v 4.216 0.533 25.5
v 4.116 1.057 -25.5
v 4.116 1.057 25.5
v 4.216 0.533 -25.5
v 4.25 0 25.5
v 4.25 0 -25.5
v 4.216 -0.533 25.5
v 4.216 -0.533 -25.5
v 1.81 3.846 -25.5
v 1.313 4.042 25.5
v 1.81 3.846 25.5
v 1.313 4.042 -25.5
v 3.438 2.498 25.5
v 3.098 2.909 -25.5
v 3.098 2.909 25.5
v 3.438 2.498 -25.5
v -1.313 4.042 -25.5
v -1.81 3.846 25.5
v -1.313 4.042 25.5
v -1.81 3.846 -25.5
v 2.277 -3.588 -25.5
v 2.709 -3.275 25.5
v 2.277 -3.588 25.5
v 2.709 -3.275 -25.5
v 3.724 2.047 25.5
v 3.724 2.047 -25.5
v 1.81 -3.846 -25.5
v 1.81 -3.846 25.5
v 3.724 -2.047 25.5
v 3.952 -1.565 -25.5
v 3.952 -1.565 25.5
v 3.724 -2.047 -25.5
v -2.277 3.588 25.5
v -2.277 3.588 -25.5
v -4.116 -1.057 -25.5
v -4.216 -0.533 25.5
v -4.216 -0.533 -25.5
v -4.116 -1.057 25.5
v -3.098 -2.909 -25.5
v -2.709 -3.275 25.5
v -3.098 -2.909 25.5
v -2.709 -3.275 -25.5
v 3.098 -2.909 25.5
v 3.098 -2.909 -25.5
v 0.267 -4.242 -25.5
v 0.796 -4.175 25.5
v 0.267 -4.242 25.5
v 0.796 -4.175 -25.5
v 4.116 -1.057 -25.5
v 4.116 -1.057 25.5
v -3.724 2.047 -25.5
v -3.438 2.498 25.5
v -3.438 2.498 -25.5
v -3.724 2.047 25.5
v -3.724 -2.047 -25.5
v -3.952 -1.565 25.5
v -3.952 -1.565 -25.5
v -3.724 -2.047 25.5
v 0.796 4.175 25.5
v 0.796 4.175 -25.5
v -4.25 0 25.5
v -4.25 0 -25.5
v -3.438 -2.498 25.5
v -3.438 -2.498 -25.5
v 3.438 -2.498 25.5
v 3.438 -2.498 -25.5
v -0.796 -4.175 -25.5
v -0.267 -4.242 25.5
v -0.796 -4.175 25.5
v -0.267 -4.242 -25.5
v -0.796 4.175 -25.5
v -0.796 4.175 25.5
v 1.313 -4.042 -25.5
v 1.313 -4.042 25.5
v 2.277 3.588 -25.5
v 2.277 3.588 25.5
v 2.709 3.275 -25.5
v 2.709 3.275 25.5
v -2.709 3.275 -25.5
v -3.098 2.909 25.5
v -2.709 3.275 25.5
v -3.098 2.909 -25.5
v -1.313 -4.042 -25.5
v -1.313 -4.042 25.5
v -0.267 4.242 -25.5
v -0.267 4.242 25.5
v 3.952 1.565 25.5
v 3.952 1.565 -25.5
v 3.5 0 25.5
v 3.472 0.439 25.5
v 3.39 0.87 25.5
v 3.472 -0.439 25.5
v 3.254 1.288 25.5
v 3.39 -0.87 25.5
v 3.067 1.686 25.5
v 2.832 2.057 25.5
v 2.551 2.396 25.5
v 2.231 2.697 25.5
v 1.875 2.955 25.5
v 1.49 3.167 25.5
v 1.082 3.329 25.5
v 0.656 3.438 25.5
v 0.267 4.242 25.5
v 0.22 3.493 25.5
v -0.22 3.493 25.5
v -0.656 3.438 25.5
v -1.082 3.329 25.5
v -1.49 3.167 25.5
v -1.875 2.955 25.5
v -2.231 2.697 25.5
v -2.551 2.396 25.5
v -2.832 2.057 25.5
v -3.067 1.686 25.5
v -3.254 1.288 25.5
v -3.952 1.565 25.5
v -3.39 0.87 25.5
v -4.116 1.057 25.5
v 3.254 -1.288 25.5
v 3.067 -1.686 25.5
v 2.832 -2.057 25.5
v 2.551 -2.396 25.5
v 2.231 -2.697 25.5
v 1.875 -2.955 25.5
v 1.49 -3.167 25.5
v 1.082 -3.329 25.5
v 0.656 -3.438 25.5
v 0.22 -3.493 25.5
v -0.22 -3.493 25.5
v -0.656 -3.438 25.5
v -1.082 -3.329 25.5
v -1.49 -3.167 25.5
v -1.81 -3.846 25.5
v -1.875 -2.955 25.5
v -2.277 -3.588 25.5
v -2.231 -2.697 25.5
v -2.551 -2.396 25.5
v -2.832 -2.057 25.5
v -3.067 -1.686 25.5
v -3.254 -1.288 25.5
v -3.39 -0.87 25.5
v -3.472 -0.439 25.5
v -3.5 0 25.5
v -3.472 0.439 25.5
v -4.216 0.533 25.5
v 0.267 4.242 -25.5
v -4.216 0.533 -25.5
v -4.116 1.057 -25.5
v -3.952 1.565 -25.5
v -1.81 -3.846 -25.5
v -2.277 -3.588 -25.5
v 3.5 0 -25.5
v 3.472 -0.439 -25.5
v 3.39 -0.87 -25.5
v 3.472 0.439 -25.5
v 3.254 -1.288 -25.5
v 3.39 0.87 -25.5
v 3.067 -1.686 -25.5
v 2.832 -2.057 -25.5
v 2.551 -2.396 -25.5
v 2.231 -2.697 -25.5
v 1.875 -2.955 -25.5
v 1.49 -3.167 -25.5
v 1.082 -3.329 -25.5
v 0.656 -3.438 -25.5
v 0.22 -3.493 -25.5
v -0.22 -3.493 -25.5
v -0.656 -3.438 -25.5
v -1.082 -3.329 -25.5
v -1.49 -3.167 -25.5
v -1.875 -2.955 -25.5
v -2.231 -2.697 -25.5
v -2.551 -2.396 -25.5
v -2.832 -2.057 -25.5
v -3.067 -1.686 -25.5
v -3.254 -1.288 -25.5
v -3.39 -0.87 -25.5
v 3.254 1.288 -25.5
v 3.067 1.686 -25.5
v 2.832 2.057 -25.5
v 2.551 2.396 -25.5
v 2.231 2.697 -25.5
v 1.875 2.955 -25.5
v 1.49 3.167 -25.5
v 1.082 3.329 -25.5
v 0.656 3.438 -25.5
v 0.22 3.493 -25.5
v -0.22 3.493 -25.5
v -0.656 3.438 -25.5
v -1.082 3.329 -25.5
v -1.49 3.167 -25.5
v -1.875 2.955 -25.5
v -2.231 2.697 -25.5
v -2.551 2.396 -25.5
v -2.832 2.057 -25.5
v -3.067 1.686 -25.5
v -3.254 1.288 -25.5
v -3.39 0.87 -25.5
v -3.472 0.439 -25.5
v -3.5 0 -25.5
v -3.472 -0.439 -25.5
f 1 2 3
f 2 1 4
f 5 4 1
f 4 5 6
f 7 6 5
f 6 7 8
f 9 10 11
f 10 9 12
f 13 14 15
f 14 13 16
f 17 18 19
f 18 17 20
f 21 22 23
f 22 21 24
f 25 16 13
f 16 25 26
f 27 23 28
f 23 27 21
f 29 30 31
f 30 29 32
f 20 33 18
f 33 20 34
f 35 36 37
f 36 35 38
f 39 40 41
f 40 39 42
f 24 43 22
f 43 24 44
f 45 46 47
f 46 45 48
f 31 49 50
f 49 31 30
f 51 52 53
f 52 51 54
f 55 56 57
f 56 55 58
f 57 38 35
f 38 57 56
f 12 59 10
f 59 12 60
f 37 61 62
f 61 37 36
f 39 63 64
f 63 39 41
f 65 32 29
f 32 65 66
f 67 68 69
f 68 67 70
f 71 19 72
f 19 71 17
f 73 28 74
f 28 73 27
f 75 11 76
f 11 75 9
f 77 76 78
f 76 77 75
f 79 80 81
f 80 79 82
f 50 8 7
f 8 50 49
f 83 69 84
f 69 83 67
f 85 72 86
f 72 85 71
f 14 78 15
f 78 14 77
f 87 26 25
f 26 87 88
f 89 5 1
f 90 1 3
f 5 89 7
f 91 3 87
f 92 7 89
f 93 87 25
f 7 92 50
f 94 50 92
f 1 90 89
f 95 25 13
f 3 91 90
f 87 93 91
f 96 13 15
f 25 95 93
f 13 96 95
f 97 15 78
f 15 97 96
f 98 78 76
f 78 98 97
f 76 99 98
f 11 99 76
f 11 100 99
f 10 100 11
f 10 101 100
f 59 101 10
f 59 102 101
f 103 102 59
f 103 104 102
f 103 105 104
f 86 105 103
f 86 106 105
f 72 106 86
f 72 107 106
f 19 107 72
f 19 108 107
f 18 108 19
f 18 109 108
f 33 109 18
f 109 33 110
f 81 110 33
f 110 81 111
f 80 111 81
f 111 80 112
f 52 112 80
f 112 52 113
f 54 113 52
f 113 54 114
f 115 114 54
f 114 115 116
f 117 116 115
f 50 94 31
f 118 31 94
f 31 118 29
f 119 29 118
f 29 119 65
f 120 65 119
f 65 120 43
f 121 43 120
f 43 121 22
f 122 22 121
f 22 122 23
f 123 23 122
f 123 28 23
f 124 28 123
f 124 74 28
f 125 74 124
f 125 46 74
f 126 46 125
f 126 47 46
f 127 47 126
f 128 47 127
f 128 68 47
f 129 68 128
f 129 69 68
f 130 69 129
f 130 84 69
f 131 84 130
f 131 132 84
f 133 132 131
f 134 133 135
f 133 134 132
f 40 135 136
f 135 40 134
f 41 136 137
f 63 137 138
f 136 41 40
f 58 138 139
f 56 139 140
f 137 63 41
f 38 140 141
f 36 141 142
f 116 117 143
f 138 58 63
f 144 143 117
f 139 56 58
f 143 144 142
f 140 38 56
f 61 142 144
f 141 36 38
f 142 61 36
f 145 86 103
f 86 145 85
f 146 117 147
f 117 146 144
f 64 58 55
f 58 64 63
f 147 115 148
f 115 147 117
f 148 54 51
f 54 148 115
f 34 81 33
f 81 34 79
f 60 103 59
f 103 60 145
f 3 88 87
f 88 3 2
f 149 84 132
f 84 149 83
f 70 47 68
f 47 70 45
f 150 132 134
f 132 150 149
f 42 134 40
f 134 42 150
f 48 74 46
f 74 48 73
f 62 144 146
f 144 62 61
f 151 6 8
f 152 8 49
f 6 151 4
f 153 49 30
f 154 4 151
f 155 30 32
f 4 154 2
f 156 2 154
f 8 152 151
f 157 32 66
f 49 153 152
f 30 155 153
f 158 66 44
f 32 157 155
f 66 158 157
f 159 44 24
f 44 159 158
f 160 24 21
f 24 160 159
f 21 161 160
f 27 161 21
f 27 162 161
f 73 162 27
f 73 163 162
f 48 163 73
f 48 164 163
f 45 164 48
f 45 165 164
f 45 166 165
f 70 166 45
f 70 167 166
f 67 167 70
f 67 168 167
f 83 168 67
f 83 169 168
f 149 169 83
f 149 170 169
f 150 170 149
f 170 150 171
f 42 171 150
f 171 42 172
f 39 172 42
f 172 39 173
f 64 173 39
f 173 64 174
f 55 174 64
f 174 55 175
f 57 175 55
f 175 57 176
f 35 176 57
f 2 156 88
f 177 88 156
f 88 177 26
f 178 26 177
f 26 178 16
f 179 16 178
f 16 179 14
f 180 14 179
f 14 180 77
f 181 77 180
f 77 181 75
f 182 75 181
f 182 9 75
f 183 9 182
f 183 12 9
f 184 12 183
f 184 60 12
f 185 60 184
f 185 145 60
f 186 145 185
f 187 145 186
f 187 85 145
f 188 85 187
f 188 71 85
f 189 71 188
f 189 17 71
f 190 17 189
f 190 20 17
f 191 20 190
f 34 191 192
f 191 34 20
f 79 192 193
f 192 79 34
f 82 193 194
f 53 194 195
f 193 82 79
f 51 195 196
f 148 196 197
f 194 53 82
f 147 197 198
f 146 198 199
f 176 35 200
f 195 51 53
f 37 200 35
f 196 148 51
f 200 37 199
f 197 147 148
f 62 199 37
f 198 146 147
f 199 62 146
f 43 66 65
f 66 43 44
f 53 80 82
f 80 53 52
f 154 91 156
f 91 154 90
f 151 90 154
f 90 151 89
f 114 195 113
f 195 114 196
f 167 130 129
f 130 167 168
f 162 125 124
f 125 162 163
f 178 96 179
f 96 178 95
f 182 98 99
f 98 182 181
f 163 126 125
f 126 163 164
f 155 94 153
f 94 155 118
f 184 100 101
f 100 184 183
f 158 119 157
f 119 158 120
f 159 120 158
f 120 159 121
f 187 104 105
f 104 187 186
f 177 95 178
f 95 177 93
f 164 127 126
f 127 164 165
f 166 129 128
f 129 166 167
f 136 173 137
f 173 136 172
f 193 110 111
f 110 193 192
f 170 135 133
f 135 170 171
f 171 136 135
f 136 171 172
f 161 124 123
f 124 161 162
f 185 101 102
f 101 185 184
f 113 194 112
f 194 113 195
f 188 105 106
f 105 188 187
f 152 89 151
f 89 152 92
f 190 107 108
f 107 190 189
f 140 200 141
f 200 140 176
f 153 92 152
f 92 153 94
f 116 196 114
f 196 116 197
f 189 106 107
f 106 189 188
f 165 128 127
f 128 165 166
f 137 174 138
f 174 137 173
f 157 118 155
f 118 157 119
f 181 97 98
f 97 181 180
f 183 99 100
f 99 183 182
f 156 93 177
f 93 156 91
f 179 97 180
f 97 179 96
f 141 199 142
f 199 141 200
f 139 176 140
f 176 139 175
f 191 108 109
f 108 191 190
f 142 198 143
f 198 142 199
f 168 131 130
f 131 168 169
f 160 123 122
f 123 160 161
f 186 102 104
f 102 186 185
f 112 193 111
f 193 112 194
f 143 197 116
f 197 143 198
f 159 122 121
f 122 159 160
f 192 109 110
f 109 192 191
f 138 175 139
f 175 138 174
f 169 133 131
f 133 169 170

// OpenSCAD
$fn = 50;


difference() {
	union() {
		translate(v = [0, 0, -25.5000000000]) {
			cylinder(h = 51, r = 4.2500000000);
		}
	}
	union() {
		translate(v = [0, 0, -100.0000000000]) {
			cylinder(h = 200, r = 3.5000000000);
		}
	}
}
